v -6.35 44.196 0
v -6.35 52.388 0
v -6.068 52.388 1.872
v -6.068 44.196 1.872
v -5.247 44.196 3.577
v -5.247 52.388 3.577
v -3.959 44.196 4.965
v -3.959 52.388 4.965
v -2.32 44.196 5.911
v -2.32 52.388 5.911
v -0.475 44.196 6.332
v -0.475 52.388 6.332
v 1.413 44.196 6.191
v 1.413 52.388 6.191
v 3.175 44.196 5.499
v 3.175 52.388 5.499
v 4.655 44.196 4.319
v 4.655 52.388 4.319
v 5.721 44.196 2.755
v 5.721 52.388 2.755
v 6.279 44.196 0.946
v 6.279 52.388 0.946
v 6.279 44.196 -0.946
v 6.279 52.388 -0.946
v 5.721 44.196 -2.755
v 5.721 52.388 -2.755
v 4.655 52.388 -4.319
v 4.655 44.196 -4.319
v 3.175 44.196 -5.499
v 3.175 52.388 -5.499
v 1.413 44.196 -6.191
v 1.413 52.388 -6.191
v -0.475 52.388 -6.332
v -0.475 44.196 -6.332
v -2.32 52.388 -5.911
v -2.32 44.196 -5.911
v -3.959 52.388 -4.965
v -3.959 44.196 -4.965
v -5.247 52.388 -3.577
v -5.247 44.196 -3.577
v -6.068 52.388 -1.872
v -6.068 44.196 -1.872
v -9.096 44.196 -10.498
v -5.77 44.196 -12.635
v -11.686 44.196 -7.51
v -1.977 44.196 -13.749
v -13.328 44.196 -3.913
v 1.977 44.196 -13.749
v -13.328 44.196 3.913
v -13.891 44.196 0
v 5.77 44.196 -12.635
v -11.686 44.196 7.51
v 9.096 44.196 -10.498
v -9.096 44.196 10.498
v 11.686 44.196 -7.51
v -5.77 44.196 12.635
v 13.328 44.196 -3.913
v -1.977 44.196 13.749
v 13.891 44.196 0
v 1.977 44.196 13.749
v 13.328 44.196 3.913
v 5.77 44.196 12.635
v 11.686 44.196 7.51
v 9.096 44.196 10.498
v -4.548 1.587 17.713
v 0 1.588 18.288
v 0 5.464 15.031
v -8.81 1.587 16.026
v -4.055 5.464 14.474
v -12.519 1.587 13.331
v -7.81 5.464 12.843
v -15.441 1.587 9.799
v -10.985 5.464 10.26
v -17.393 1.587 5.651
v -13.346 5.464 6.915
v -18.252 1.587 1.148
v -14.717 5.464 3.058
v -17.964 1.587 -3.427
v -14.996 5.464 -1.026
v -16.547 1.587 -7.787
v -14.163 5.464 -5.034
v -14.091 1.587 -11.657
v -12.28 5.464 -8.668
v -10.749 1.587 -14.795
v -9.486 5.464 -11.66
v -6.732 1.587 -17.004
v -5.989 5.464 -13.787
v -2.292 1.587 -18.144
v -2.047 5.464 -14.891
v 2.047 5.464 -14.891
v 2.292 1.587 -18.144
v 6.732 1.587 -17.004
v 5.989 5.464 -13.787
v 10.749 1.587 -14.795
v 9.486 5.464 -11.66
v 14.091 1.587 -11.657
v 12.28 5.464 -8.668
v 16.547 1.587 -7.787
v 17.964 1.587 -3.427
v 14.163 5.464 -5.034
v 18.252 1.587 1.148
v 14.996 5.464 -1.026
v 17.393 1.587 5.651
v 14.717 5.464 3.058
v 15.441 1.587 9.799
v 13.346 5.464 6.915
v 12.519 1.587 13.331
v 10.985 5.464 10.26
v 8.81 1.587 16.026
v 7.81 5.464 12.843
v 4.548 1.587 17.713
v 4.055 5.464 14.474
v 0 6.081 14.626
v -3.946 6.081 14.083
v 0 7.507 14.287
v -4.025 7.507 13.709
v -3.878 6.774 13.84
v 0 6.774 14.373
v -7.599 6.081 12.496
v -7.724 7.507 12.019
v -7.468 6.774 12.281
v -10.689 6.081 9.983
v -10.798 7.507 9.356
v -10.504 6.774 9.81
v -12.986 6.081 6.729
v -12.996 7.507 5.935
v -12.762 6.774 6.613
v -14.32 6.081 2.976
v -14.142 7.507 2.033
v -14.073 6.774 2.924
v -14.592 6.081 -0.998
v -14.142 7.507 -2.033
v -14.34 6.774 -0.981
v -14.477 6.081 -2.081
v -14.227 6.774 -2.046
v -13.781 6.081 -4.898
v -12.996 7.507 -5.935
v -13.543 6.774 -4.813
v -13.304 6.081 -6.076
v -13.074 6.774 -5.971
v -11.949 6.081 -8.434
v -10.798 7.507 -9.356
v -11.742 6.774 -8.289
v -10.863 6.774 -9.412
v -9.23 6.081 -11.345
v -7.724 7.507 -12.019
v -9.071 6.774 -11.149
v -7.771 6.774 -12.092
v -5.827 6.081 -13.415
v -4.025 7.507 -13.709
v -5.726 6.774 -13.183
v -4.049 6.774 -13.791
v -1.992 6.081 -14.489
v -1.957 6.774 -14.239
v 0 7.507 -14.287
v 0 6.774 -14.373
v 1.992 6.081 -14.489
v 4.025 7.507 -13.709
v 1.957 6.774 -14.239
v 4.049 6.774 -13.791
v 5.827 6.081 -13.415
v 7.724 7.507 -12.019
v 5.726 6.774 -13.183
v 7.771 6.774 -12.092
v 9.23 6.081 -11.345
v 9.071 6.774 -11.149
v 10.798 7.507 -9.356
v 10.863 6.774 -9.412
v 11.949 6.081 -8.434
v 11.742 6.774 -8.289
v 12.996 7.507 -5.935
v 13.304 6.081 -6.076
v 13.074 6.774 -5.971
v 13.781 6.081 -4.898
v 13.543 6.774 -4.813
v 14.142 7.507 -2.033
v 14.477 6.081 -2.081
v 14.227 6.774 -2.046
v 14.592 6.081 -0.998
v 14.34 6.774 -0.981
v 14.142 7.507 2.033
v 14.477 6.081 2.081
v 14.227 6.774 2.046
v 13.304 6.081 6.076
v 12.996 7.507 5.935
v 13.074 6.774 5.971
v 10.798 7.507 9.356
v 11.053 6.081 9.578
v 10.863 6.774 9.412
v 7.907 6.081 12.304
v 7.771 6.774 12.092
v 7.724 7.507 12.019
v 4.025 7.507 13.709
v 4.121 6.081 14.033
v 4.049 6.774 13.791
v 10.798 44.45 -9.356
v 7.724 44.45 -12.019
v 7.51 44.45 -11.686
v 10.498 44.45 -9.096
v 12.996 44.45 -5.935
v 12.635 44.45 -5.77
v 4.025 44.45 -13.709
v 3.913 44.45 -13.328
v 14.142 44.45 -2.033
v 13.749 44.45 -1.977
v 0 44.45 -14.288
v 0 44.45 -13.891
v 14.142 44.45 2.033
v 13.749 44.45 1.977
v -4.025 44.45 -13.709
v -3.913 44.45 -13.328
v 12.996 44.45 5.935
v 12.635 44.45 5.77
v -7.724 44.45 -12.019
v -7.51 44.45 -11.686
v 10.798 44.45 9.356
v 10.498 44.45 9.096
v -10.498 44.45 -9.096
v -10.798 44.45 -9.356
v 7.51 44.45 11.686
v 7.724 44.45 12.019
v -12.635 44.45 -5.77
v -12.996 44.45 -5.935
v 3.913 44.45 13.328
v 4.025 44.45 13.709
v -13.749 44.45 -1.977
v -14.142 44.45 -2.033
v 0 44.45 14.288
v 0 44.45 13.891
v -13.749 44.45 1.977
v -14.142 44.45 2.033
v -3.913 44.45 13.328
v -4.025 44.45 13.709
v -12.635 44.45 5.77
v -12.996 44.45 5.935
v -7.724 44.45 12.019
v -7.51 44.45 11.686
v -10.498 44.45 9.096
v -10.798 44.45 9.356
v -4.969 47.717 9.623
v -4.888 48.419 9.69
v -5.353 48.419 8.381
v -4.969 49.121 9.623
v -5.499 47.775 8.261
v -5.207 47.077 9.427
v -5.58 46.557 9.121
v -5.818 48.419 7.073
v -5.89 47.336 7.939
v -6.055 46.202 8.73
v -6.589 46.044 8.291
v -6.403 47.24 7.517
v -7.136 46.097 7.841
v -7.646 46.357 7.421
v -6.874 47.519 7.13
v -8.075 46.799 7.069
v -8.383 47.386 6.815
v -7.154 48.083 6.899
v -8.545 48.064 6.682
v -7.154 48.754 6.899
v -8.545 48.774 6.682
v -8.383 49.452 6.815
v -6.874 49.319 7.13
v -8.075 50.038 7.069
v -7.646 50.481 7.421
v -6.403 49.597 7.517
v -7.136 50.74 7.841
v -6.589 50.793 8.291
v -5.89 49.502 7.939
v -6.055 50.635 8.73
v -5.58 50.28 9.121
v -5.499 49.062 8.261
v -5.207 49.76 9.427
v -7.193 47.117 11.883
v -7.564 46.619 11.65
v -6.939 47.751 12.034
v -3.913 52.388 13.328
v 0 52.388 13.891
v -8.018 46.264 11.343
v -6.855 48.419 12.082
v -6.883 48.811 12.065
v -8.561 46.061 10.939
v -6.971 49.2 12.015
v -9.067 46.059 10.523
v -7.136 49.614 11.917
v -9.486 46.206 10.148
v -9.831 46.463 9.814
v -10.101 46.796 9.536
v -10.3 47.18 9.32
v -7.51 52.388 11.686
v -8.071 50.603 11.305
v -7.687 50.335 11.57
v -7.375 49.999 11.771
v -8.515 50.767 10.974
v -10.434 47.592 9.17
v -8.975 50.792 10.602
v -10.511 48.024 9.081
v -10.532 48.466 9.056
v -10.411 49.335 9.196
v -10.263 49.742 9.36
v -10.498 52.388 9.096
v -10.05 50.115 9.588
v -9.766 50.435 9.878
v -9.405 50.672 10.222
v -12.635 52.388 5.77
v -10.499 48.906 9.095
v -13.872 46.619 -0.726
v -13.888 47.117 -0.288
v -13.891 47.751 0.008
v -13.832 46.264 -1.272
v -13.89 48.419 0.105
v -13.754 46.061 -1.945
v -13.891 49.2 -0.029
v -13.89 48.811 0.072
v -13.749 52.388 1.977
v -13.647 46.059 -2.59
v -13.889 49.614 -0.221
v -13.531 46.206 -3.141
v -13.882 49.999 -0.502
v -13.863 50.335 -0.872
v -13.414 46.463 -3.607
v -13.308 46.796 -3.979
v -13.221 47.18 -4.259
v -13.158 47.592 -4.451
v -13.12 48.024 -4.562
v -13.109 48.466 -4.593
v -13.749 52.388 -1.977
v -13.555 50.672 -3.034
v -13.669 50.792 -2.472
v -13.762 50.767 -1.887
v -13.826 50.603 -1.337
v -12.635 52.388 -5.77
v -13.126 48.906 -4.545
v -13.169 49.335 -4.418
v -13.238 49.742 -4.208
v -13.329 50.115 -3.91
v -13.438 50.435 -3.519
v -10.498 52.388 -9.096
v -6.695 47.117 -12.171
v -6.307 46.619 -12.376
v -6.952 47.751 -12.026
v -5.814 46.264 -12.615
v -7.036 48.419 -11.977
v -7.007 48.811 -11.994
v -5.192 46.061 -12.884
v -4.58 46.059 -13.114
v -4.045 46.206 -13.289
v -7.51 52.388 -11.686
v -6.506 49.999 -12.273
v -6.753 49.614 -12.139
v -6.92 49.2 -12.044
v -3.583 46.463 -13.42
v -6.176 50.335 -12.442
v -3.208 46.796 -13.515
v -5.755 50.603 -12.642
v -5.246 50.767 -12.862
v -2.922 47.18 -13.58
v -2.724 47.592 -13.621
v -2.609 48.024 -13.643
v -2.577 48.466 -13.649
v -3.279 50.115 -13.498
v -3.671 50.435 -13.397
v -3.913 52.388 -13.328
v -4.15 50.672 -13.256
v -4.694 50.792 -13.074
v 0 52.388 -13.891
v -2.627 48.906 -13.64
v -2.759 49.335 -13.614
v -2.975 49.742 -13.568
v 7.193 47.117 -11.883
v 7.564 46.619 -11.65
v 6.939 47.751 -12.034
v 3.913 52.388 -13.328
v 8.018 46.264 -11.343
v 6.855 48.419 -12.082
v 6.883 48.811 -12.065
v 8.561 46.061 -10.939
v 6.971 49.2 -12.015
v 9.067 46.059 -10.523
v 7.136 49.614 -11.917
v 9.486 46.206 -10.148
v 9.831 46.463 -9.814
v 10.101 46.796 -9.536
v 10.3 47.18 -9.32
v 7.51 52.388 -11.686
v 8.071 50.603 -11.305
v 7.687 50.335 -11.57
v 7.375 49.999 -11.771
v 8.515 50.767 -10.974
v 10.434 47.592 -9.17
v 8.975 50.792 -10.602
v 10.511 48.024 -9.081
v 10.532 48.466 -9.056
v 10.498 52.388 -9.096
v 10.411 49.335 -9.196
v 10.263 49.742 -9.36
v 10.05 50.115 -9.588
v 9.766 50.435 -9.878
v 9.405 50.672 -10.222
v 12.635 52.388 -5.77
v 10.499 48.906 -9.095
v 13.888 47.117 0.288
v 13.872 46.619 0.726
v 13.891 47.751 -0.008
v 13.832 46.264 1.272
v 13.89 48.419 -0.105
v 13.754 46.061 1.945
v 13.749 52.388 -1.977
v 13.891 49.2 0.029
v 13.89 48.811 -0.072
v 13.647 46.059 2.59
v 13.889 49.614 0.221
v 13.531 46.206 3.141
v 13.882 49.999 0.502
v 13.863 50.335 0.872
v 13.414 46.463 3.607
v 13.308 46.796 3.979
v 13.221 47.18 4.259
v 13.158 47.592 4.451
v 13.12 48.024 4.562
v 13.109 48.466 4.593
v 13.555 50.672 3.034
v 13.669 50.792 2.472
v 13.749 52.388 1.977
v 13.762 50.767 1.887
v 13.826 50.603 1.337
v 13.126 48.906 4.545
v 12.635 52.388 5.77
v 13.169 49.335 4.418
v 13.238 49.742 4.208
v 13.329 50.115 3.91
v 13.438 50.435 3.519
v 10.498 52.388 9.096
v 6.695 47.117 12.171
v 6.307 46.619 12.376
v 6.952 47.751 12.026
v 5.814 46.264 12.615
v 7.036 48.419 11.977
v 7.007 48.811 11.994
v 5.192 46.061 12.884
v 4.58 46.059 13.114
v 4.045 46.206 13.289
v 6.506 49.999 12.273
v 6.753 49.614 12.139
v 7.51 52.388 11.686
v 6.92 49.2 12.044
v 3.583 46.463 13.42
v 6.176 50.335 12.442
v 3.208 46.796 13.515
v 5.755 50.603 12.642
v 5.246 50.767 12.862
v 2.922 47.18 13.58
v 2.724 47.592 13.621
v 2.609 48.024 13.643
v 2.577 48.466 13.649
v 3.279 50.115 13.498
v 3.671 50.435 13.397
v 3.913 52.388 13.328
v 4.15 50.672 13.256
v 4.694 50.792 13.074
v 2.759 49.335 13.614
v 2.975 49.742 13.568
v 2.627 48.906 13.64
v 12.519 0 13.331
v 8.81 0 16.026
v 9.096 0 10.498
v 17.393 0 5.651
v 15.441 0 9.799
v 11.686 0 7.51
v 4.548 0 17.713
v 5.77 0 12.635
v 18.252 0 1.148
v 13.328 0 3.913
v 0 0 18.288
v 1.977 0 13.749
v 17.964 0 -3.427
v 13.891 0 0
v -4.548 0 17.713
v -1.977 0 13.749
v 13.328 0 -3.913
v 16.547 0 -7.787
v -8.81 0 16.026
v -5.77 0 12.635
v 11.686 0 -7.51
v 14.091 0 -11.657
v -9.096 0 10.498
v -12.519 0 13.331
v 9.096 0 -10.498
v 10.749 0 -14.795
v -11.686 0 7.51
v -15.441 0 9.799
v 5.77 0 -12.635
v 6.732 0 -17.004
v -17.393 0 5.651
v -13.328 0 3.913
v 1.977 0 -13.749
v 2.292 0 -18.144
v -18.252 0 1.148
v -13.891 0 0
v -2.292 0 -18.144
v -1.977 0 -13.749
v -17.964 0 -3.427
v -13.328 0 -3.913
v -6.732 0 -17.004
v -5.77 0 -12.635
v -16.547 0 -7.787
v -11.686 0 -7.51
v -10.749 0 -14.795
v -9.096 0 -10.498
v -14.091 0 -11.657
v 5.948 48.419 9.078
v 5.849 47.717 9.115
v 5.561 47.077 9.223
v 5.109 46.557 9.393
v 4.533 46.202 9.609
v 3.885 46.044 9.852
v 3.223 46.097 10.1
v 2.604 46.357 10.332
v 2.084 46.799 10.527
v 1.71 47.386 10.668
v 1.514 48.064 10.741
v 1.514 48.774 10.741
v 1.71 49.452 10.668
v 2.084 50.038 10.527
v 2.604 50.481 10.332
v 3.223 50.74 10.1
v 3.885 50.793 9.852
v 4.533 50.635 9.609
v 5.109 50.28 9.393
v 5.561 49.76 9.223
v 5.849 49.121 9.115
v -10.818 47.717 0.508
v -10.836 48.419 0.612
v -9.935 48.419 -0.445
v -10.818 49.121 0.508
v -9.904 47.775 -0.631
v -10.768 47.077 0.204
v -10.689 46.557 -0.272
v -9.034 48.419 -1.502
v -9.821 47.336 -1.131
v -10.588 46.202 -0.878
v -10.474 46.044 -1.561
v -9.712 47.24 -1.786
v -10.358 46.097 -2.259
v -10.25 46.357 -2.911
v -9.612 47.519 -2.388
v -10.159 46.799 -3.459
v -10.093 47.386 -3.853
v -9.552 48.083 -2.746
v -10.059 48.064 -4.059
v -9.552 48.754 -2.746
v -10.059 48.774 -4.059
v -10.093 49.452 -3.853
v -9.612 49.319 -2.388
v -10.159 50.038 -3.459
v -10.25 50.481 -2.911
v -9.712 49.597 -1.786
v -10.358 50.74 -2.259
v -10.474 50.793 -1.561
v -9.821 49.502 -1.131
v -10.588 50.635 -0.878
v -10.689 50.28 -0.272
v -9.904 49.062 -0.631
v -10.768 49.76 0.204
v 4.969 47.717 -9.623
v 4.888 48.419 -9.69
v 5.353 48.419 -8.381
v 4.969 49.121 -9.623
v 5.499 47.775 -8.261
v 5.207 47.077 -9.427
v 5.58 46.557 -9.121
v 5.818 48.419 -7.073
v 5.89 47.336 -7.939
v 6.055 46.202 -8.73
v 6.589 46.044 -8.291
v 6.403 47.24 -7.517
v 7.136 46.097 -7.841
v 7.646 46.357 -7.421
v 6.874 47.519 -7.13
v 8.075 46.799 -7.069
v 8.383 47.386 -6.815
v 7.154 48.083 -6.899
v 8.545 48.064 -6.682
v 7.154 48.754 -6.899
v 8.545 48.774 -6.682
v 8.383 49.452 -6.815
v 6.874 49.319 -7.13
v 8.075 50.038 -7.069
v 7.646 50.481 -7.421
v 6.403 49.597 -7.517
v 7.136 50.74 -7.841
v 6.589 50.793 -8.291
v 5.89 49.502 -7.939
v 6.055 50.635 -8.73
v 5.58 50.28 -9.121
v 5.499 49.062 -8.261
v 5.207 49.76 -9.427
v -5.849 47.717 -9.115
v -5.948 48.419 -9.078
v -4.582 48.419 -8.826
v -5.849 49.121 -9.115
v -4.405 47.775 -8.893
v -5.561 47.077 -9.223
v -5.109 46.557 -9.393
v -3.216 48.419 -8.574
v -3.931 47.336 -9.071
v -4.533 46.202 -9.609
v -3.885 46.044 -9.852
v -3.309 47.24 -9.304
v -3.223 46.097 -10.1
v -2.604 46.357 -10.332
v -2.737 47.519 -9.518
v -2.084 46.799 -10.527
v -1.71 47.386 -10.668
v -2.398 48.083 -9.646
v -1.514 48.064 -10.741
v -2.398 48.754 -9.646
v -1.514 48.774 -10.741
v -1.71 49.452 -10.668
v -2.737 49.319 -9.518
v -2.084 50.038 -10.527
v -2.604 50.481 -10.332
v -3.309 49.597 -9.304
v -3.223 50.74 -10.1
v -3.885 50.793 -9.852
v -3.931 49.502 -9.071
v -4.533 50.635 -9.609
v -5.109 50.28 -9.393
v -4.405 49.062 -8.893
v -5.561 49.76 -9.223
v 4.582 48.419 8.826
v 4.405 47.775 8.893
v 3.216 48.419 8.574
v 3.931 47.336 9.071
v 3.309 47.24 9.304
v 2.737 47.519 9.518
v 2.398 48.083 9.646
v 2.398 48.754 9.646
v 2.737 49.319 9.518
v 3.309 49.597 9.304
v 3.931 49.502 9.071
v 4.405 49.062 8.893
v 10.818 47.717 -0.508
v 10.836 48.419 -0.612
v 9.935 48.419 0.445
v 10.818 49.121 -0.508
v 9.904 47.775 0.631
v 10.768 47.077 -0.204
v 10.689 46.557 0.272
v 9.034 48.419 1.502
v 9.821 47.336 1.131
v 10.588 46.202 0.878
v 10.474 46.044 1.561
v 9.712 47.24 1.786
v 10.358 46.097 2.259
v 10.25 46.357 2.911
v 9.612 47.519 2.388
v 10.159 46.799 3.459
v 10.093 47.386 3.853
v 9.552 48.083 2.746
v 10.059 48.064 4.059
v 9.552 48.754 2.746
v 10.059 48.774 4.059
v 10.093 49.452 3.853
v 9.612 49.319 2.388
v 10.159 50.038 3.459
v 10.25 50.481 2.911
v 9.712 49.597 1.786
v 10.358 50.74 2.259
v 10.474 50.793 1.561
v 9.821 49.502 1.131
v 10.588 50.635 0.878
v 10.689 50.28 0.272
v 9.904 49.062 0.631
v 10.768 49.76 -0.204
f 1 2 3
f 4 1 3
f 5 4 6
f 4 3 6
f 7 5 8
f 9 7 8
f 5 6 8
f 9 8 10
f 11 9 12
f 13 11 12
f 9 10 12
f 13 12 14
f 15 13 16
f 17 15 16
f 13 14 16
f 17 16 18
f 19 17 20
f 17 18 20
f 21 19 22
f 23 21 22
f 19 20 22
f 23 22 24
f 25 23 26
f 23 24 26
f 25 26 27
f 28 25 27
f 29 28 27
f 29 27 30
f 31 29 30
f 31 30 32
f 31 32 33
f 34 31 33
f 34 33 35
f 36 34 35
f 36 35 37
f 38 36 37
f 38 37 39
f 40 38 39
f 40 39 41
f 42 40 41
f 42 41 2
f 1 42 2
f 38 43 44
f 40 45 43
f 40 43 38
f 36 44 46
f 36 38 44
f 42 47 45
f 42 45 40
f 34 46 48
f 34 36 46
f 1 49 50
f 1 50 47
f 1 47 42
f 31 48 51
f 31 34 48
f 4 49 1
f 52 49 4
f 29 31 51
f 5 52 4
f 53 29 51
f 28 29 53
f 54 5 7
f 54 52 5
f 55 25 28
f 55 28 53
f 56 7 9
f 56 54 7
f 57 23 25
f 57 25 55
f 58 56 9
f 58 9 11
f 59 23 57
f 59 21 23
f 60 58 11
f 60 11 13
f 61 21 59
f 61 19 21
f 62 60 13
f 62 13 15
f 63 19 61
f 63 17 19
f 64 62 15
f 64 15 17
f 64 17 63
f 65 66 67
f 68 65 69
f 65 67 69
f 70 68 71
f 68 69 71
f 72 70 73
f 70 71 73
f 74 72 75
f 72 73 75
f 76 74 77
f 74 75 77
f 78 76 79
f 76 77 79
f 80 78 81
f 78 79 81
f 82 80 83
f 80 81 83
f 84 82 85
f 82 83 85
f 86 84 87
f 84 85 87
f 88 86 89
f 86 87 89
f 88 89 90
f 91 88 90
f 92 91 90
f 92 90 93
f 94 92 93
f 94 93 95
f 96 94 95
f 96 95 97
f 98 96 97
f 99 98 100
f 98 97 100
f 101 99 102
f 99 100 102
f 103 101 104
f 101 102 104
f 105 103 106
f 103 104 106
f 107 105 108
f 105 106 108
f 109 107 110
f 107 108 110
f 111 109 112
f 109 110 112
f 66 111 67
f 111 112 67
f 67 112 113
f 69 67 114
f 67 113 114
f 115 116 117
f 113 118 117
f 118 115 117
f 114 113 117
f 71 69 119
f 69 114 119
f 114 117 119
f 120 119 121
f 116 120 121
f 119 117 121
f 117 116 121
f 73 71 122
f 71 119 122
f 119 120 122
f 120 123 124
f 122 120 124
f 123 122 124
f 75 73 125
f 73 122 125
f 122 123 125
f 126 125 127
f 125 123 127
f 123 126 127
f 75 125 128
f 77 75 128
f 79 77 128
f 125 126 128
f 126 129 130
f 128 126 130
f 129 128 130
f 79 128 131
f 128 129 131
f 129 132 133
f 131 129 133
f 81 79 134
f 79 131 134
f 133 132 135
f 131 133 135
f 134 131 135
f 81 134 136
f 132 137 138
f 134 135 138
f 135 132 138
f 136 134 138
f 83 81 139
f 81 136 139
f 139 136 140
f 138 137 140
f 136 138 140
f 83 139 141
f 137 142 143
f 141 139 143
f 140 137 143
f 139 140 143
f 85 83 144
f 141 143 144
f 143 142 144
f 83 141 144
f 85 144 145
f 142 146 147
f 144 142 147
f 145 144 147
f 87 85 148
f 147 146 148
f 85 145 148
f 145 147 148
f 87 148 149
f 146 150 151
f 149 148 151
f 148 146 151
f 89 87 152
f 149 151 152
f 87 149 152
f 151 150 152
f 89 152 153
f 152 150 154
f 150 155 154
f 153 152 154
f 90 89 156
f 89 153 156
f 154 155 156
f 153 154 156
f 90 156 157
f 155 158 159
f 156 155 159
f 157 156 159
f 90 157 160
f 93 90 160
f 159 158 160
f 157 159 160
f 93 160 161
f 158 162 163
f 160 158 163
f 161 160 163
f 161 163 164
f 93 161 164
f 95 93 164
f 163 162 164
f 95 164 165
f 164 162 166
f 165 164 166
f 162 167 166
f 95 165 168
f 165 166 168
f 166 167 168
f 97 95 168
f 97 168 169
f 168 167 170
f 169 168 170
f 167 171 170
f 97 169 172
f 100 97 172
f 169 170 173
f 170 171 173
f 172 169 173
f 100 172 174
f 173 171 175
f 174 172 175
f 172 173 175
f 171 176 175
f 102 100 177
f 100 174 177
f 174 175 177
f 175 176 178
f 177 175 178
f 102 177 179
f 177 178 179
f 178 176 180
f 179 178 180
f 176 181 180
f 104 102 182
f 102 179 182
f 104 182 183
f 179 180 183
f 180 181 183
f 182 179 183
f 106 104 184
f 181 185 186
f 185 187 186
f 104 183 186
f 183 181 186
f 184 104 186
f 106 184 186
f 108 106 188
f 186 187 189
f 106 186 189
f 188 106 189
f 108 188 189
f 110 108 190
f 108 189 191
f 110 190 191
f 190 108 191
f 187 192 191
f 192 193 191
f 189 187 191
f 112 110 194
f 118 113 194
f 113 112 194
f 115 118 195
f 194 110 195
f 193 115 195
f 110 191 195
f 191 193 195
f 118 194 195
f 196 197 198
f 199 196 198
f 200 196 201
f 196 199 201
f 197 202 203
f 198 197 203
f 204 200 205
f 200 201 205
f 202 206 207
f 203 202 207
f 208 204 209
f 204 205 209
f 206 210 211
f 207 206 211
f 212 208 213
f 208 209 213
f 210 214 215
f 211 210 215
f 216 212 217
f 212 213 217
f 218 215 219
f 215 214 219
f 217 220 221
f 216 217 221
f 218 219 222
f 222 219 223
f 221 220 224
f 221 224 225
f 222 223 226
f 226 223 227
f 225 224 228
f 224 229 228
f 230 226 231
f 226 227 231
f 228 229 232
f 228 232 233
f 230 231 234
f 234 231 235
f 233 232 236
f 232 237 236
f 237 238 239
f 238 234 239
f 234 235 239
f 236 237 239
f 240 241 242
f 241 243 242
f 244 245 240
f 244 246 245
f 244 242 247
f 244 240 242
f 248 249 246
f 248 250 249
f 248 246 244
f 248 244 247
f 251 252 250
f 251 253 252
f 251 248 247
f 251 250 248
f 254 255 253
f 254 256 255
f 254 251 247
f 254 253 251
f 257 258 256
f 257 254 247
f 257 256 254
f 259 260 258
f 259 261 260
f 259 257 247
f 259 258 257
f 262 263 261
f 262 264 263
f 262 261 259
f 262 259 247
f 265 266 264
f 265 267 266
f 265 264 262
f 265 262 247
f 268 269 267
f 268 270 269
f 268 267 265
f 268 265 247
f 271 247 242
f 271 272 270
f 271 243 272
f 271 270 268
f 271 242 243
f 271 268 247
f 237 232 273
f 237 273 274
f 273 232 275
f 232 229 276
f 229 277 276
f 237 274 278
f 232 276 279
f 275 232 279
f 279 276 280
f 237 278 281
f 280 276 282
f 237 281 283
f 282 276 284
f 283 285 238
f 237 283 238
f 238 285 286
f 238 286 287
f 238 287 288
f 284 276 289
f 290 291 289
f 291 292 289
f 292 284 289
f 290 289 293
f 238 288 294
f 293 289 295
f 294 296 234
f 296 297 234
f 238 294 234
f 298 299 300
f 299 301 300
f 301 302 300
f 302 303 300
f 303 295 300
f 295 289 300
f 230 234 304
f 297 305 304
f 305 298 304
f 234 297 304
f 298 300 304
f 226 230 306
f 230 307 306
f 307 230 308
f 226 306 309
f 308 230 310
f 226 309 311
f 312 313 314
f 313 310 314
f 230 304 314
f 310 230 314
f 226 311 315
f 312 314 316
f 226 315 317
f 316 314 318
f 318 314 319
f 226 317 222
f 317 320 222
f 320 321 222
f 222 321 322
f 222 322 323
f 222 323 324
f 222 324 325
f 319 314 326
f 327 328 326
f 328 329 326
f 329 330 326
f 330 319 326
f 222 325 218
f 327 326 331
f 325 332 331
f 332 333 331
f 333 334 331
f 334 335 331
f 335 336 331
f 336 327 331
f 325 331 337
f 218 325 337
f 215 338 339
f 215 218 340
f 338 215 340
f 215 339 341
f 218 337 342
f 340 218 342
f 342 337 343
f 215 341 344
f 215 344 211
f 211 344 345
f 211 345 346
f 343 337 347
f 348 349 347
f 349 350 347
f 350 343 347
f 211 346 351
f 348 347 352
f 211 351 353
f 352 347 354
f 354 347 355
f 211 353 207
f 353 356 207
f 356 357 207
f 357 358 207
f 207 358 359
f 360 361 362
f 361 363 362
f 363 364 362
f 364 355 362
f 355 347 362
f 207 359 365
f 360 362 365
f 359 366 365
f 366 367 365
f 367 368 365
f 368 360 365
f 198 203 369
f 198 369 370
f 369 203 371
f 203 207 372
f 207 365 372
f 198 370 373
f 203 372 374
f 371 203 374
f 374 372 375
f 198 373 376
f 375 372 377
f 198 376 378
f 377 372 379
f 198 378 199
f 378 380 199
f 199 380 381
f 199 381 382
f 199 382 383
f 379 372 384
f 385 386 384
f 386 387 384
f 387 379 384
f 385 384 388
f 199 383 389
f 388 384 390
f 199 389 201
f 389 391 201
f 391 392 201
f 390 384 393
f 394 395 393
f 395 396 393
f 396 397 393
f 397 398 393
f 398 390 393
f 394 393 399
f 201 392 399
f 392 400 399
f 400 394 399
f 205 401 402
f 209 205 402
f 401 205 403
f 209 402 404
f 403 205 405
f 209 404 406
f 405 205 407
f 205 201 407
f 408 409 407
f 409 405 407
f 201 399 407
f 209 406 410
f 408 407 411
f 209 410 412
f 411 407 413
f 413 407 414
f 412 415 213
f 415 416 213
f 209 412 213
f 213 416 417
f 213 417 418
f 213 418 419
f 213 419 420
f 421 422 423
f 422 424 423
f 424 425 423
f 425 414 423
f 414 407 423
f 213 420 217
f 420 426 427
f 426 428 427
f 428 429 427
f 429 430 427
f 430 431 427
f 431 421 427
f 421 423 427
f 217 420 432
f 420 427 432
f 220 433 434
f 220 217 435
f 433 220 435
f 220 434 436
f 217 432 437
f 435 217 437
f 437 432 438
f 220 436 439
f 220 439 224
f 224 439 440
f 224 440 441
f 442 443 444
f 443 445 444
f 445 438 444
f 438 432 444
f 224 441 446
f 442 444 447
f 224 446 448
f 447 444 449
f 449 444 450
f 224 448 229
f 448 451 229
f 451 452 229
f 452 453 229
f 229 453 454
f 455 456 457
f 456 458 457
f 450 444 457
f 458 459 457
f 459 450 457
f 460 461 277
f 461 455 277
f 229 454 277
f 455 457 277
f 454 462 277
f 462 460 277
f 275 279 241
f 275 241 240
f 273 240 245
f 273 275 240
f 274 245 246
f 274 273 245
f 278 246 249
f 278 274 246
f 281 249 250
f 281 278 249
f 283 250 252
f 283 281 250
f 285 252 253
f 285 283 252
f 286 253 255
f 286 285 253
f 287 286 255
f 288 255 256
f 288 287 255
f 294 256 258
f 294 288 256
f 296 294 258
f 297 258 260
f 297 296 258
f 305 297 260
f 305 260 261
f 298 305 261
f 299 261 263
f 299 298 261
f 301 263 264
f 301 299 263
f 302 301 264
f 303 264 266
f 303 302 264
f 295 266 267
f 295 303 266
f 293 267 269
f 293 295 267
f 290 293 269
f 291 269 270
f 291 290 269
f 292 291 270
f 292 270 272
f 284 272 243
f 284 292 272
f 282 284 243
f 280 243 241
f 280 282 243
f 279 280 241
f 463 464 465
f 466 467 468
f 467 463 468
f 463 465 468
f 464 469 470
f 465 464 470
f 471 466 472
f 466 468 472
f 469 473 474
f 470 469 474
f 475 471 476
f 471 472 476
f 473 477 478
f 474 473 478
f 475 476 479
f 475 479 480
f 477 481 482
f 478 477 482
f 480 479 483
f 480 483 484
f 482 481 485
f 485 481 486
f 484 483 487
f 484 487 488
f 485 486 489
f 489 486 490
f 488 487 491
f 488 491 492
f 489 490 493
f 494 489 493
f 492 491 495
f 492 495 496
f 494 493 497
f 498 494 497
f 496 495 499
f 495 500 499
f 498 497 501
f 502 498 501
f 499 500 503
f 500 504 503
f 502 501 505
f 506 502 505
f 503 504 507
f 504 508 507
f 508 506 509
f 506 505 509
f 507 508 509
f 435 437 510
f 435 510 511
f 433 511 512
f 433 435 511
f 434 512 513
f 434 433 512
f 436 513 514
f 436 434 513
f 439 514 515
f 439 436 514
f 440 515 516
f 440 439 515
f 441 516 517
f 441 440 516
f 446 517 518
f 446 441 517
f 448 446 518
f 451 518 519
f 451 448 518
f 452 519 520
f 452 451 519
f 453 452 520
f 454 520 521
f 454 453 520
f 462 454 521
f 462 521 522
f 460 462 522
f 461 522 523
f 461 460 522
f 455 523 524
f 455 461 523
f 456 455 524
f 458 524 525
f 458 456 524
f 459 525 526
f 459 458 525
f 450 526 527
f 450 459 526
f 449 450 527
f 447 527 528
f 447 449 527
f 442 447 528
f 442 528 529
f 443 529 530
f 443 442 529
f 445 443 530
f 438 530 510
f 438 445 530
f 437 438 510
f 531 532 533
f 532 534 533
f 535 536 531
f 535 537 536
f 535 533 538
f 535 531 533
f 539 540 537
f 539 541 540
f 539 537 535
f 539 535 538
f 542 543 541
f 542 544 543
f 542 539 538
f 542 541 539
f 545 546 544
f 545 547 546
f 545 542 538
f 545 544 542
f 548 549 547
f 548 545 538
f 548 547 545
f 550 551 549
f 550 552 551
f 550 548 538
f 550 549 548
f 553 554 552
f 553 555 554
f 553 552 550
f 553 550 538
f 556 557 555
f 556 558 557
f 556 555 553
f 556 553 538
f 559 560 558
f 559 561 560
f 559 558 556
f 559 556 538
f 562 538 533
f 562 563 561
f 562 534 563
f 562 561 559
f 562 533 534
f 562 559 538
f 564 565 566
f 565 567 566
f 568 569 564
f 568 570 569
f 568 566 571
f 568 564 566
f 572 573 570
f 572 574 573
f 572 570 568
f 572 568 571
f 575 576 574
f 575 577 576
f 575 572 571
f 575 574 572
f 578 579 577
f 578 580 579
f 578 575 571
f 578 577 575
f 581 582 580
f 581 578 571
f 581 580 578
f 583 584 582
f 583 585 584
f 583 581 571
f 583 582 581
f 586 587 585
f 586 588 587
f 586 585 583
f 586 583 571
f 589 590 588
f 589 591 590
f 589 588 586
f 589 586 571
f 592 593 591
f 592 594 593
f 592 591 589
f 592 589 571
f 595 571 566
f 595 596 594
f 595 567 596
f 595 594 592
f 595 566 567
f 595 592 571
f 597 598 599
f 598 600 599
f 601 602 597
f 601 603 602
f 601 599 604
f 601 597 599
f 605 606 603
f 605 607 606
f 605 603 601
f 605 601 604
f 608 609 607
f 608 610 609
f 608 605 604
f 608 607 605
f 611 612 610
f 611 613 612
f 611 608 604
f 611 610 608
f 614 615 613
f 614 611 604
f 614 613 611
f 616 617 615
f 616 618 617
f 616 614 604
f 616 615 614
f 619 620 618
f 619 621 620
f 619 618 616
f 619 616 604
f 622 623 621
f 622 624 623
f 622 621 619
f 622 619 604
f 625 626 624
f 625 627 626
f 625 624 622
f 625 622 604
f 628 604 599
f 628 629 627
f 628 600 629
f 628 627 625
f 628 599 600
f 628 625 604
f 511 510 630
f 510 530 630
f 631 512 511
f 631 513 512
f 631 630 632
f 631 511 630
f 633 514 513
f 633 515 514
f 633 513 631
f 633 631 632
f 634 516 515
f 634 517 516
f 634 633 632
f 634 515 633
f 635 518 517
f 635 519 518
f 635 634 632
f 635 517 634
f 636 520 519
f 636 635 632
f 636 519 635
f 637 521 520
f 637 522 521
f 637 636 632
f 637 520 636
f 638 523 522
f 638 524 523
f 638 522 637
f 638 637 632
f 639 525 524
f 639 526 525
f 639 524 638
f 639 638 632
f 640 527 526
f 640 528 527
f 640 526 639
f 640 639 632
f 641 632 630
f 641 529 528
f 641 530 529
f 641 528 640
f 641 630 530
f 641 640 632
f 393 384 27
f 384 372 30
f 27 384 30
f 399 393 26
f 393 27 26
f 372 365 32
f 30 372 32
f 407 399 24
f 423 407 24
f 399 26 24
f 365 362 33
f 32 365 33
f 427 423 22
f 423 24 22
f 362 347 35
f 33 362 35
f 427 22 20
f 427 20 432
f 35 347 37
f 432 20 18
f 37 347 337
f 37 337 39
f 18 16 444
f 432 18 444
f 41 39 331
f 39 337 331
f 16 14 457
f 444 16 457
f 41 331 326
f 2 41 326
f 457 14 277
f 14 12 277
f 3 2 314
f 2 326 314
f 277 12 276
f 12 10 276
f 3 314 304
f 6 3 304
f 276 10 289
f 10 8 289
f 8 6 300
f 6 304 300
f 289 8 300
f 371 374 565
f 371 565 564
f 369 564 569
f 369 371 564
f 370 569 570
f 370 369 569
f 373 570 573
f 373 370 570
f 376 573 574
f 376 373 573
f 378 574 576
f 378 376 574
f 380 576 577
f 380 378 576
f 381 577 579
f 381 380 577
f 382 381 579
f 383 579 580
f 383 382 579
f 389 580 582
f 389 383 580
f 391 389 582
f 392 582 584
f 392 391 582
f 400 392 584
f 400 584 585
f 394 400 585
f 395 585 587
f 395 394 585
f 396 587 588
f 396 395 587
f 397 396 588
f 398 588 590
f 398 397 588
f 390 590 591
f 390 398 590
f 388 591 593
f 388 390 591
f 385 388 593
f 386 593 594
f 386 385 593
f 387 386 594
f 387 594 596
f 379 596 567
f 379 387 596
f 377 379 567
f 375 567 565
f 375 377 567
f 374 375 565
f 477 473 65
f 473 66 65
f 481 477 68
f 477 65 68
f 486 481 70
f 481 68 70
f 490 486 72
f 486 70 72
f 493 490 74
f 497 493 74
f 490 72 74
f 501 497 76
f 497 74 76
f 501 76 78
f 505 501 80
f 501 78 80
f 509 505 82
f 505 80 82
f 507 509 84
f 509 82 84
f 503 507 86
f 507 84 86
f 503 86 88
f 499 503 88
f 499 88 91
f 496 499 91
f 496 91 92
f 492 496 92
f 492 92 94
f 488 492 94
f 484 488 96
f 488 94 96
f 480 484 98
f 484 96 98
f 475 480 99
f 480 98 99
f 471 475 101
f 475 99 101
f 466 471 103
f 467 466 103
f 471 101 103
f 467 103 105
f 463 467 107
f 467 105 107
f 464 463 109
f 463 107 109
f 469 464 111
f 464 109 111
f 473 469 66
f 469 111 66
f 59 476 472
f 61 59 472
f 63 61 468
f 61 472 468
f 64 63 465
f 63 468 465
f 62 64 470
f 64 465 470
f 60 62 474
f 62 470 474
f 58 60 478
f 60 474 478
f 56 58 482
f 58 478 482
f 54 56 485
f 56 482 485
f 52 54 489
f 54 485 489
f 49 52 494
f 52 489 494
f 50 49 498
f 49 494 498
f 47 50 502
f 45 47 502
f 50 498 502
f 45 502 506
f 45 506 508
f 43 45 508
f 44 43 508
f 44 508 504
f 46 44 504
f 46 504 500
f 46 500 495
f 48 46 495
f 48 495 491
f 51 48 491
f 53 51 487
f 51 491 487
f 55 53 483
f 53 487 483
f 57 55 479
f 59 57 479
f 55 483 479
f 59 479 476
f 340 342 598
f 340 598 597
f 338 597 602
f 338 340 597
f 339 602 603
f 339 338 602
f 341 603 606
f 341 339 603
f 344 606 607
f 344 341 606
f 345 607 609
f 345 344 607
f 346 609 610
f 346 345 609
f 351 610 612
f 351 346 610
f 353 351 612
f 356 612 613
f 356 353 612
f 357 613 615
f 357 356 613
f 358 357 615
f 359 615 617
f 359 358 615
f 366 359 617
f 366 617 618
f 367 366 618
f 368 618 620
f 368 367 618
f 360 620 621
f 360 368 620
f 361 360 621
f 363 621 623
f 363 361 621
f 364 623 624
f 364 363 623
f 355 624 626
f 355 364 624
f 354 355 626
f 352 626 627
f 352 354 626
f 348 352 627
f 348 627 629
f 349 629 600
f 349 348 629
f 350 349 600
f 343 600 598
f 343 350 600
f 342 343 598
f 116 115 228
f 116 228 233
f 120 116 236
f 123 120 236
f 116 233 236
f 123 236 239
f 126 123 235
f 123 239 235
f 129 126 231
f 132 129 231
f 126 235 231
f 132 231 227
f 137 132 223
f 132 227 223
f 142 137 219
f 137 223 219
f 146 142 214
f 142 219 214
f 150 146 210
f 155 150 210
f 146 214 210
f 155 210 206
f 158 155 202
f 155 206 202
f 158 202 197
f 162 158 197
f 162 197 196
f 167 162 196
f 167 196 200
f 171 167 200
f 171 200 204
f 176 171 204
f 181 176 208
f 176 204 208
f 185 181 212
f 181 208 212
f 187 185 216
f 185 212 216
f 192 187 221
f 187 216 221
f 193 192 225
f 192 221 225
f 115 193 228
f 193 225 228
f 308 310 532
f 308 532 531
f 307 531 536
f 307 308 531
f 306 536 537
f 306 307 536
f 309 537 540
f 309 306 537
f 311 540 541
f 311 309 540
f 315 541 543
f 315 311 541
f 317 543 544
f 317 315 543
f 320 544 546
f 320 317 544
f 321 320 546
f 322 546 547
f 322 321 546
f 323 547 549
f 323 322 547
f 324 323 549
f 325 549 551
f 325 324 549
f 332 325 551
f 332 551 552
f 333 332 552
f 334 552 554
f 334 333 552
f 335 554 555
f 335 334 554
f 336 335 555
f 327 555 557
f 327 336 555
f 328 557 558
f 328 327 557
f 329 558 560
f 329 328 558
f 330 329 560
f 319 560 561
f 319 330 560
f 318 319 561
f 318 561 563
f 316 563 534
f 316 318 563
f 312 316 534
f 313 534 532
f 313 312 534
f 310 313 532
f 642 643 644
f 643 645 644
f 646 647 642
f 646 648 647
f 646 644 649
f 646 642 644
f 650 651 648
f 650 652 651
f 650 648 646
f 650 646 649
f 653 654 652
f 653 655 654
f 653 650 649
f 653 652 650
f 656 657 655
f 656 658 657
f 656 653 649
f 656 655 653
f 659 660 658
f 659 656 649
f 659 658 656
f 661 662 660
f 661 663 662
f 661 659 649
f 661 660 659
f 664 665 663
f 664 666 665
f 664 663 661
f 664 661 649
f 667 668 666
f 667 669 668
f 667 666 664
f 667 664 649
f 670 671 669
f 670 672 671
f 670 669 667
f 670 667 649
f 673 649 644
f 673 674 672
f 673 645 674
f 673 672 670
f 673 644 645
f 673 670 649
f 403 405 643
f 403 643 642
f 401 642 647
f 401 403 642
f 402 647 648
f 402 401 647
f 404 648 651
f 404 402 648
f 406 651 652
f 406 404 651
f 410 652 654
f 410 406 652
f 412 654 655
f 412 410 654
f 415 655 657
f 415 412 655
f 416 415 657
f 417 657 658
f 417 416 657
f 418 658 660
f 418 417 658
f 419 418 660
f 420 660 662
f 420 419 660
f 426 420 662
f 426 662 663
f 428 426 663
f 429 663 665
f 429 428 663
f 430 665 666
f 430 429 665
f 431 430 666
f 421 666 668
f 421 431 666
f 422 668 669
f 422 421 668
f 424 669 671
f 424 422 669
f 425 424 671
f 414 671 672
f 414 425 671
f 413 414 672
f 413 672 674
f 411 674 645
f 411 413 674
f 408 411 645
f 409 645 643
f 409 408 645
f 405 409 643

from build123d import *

# Parameters (mm, degrees)
SKETCH2_R         = 13.890625
EXTRUDE2_DEPTH    = 44.196
CIRPATTERN1_COUNT = 6
SKETCH5_R         = 6.35
EXTRUDE3_DEPTH    = 53.3875


with BuildPart() as part:
    # Sketch1 → Revolve1 (revolve)
    with BuildSketch(Plane(origin=(0, 0, 0), x_dir=(0, 0, -1), z_dir=(1, 0, 0))):
        with BuildLine():
            Line((-18.288, 0), (-18.288, 1.5875))
            Line((-18.288, 1.5875), (-15.031387054, 5.464420173))
            ThreePointArc((-15.031387054, 5.464420173), (-14.479262782, 6.419853295), (-14.2875, 7.506555048))
            Line((-14.2875, 7.506555048), (-14.2875, 44.45))
            Line((-14.2875, 44.45), (-13.890625, 44.45))
            Line((-13.890625, 44.45), (-13.890625, 52.3875))
            Line((-13.890625, 52.3875), (0, 52.3875))
            Line((0, 52.3875), (0, 0))
            Line((0, 0), (-18.288, 0))
        make_face()
    revolve(axis=Axis((0, 52.3875, 0), (0, -1, 0)))

    # Sketch2 → Extrude2 (cut)
    with BuildSketch(Plane.XZ):
        Circle(SKETCH2_R)
    extrude(amount=-EXTRUDE2_DEPTH, mode=Mode.SUBTRACT)

    # Sketch4 → 3/16 (0.1875) Diameter Hole1 (revolve, cut)
    with BuildSketch(Plane(origin=(13.702535491, 48.41875, 2.278153639), x_dir=(0.164006561, 0, -0.986459248), z_dir=(0, 1, 0))):
        Polygon((0, 0), (0, 4.732799349), (2.38125, 3.302), (2.38125, 0), align=None)
    f_3_16_0_1875_diameter_hole1 = revolve(axis=Axis((19.966551716, 48.41875, 3.319595303), (-0.986459248, 0, -0.164006561)), mode=Mode.SUBTRACT)

    # CirPattern1: 3/16 (0.1875) Diameter Hole1 ×6 about axis
    cirpattern1_axis = Axis((0, 52.3875, 0), (0, 1, 0))
    for i in range(1, CIRPATTERN1_COUNT):
        add(f_3_16_0_1875_diameter_hole1.rotate(cirpattern1_axis, i * 360 / CIRPATTERN1_COUNT), mode=Mode.SUBTRACT)

    # Sketch5 → Extrude3 (cut, through all)
    with BuildSketch(Plane(origin=(0, 52.3875, 0), x_dir=(-1, 0, 0), z_dir=(0, 1, 0))):
        Circle(SKETCH5_R)
    extrude(amount=-EXTRUDE3_DEPTH, mode=Mode.SUBTRACT)


solid = part.part
